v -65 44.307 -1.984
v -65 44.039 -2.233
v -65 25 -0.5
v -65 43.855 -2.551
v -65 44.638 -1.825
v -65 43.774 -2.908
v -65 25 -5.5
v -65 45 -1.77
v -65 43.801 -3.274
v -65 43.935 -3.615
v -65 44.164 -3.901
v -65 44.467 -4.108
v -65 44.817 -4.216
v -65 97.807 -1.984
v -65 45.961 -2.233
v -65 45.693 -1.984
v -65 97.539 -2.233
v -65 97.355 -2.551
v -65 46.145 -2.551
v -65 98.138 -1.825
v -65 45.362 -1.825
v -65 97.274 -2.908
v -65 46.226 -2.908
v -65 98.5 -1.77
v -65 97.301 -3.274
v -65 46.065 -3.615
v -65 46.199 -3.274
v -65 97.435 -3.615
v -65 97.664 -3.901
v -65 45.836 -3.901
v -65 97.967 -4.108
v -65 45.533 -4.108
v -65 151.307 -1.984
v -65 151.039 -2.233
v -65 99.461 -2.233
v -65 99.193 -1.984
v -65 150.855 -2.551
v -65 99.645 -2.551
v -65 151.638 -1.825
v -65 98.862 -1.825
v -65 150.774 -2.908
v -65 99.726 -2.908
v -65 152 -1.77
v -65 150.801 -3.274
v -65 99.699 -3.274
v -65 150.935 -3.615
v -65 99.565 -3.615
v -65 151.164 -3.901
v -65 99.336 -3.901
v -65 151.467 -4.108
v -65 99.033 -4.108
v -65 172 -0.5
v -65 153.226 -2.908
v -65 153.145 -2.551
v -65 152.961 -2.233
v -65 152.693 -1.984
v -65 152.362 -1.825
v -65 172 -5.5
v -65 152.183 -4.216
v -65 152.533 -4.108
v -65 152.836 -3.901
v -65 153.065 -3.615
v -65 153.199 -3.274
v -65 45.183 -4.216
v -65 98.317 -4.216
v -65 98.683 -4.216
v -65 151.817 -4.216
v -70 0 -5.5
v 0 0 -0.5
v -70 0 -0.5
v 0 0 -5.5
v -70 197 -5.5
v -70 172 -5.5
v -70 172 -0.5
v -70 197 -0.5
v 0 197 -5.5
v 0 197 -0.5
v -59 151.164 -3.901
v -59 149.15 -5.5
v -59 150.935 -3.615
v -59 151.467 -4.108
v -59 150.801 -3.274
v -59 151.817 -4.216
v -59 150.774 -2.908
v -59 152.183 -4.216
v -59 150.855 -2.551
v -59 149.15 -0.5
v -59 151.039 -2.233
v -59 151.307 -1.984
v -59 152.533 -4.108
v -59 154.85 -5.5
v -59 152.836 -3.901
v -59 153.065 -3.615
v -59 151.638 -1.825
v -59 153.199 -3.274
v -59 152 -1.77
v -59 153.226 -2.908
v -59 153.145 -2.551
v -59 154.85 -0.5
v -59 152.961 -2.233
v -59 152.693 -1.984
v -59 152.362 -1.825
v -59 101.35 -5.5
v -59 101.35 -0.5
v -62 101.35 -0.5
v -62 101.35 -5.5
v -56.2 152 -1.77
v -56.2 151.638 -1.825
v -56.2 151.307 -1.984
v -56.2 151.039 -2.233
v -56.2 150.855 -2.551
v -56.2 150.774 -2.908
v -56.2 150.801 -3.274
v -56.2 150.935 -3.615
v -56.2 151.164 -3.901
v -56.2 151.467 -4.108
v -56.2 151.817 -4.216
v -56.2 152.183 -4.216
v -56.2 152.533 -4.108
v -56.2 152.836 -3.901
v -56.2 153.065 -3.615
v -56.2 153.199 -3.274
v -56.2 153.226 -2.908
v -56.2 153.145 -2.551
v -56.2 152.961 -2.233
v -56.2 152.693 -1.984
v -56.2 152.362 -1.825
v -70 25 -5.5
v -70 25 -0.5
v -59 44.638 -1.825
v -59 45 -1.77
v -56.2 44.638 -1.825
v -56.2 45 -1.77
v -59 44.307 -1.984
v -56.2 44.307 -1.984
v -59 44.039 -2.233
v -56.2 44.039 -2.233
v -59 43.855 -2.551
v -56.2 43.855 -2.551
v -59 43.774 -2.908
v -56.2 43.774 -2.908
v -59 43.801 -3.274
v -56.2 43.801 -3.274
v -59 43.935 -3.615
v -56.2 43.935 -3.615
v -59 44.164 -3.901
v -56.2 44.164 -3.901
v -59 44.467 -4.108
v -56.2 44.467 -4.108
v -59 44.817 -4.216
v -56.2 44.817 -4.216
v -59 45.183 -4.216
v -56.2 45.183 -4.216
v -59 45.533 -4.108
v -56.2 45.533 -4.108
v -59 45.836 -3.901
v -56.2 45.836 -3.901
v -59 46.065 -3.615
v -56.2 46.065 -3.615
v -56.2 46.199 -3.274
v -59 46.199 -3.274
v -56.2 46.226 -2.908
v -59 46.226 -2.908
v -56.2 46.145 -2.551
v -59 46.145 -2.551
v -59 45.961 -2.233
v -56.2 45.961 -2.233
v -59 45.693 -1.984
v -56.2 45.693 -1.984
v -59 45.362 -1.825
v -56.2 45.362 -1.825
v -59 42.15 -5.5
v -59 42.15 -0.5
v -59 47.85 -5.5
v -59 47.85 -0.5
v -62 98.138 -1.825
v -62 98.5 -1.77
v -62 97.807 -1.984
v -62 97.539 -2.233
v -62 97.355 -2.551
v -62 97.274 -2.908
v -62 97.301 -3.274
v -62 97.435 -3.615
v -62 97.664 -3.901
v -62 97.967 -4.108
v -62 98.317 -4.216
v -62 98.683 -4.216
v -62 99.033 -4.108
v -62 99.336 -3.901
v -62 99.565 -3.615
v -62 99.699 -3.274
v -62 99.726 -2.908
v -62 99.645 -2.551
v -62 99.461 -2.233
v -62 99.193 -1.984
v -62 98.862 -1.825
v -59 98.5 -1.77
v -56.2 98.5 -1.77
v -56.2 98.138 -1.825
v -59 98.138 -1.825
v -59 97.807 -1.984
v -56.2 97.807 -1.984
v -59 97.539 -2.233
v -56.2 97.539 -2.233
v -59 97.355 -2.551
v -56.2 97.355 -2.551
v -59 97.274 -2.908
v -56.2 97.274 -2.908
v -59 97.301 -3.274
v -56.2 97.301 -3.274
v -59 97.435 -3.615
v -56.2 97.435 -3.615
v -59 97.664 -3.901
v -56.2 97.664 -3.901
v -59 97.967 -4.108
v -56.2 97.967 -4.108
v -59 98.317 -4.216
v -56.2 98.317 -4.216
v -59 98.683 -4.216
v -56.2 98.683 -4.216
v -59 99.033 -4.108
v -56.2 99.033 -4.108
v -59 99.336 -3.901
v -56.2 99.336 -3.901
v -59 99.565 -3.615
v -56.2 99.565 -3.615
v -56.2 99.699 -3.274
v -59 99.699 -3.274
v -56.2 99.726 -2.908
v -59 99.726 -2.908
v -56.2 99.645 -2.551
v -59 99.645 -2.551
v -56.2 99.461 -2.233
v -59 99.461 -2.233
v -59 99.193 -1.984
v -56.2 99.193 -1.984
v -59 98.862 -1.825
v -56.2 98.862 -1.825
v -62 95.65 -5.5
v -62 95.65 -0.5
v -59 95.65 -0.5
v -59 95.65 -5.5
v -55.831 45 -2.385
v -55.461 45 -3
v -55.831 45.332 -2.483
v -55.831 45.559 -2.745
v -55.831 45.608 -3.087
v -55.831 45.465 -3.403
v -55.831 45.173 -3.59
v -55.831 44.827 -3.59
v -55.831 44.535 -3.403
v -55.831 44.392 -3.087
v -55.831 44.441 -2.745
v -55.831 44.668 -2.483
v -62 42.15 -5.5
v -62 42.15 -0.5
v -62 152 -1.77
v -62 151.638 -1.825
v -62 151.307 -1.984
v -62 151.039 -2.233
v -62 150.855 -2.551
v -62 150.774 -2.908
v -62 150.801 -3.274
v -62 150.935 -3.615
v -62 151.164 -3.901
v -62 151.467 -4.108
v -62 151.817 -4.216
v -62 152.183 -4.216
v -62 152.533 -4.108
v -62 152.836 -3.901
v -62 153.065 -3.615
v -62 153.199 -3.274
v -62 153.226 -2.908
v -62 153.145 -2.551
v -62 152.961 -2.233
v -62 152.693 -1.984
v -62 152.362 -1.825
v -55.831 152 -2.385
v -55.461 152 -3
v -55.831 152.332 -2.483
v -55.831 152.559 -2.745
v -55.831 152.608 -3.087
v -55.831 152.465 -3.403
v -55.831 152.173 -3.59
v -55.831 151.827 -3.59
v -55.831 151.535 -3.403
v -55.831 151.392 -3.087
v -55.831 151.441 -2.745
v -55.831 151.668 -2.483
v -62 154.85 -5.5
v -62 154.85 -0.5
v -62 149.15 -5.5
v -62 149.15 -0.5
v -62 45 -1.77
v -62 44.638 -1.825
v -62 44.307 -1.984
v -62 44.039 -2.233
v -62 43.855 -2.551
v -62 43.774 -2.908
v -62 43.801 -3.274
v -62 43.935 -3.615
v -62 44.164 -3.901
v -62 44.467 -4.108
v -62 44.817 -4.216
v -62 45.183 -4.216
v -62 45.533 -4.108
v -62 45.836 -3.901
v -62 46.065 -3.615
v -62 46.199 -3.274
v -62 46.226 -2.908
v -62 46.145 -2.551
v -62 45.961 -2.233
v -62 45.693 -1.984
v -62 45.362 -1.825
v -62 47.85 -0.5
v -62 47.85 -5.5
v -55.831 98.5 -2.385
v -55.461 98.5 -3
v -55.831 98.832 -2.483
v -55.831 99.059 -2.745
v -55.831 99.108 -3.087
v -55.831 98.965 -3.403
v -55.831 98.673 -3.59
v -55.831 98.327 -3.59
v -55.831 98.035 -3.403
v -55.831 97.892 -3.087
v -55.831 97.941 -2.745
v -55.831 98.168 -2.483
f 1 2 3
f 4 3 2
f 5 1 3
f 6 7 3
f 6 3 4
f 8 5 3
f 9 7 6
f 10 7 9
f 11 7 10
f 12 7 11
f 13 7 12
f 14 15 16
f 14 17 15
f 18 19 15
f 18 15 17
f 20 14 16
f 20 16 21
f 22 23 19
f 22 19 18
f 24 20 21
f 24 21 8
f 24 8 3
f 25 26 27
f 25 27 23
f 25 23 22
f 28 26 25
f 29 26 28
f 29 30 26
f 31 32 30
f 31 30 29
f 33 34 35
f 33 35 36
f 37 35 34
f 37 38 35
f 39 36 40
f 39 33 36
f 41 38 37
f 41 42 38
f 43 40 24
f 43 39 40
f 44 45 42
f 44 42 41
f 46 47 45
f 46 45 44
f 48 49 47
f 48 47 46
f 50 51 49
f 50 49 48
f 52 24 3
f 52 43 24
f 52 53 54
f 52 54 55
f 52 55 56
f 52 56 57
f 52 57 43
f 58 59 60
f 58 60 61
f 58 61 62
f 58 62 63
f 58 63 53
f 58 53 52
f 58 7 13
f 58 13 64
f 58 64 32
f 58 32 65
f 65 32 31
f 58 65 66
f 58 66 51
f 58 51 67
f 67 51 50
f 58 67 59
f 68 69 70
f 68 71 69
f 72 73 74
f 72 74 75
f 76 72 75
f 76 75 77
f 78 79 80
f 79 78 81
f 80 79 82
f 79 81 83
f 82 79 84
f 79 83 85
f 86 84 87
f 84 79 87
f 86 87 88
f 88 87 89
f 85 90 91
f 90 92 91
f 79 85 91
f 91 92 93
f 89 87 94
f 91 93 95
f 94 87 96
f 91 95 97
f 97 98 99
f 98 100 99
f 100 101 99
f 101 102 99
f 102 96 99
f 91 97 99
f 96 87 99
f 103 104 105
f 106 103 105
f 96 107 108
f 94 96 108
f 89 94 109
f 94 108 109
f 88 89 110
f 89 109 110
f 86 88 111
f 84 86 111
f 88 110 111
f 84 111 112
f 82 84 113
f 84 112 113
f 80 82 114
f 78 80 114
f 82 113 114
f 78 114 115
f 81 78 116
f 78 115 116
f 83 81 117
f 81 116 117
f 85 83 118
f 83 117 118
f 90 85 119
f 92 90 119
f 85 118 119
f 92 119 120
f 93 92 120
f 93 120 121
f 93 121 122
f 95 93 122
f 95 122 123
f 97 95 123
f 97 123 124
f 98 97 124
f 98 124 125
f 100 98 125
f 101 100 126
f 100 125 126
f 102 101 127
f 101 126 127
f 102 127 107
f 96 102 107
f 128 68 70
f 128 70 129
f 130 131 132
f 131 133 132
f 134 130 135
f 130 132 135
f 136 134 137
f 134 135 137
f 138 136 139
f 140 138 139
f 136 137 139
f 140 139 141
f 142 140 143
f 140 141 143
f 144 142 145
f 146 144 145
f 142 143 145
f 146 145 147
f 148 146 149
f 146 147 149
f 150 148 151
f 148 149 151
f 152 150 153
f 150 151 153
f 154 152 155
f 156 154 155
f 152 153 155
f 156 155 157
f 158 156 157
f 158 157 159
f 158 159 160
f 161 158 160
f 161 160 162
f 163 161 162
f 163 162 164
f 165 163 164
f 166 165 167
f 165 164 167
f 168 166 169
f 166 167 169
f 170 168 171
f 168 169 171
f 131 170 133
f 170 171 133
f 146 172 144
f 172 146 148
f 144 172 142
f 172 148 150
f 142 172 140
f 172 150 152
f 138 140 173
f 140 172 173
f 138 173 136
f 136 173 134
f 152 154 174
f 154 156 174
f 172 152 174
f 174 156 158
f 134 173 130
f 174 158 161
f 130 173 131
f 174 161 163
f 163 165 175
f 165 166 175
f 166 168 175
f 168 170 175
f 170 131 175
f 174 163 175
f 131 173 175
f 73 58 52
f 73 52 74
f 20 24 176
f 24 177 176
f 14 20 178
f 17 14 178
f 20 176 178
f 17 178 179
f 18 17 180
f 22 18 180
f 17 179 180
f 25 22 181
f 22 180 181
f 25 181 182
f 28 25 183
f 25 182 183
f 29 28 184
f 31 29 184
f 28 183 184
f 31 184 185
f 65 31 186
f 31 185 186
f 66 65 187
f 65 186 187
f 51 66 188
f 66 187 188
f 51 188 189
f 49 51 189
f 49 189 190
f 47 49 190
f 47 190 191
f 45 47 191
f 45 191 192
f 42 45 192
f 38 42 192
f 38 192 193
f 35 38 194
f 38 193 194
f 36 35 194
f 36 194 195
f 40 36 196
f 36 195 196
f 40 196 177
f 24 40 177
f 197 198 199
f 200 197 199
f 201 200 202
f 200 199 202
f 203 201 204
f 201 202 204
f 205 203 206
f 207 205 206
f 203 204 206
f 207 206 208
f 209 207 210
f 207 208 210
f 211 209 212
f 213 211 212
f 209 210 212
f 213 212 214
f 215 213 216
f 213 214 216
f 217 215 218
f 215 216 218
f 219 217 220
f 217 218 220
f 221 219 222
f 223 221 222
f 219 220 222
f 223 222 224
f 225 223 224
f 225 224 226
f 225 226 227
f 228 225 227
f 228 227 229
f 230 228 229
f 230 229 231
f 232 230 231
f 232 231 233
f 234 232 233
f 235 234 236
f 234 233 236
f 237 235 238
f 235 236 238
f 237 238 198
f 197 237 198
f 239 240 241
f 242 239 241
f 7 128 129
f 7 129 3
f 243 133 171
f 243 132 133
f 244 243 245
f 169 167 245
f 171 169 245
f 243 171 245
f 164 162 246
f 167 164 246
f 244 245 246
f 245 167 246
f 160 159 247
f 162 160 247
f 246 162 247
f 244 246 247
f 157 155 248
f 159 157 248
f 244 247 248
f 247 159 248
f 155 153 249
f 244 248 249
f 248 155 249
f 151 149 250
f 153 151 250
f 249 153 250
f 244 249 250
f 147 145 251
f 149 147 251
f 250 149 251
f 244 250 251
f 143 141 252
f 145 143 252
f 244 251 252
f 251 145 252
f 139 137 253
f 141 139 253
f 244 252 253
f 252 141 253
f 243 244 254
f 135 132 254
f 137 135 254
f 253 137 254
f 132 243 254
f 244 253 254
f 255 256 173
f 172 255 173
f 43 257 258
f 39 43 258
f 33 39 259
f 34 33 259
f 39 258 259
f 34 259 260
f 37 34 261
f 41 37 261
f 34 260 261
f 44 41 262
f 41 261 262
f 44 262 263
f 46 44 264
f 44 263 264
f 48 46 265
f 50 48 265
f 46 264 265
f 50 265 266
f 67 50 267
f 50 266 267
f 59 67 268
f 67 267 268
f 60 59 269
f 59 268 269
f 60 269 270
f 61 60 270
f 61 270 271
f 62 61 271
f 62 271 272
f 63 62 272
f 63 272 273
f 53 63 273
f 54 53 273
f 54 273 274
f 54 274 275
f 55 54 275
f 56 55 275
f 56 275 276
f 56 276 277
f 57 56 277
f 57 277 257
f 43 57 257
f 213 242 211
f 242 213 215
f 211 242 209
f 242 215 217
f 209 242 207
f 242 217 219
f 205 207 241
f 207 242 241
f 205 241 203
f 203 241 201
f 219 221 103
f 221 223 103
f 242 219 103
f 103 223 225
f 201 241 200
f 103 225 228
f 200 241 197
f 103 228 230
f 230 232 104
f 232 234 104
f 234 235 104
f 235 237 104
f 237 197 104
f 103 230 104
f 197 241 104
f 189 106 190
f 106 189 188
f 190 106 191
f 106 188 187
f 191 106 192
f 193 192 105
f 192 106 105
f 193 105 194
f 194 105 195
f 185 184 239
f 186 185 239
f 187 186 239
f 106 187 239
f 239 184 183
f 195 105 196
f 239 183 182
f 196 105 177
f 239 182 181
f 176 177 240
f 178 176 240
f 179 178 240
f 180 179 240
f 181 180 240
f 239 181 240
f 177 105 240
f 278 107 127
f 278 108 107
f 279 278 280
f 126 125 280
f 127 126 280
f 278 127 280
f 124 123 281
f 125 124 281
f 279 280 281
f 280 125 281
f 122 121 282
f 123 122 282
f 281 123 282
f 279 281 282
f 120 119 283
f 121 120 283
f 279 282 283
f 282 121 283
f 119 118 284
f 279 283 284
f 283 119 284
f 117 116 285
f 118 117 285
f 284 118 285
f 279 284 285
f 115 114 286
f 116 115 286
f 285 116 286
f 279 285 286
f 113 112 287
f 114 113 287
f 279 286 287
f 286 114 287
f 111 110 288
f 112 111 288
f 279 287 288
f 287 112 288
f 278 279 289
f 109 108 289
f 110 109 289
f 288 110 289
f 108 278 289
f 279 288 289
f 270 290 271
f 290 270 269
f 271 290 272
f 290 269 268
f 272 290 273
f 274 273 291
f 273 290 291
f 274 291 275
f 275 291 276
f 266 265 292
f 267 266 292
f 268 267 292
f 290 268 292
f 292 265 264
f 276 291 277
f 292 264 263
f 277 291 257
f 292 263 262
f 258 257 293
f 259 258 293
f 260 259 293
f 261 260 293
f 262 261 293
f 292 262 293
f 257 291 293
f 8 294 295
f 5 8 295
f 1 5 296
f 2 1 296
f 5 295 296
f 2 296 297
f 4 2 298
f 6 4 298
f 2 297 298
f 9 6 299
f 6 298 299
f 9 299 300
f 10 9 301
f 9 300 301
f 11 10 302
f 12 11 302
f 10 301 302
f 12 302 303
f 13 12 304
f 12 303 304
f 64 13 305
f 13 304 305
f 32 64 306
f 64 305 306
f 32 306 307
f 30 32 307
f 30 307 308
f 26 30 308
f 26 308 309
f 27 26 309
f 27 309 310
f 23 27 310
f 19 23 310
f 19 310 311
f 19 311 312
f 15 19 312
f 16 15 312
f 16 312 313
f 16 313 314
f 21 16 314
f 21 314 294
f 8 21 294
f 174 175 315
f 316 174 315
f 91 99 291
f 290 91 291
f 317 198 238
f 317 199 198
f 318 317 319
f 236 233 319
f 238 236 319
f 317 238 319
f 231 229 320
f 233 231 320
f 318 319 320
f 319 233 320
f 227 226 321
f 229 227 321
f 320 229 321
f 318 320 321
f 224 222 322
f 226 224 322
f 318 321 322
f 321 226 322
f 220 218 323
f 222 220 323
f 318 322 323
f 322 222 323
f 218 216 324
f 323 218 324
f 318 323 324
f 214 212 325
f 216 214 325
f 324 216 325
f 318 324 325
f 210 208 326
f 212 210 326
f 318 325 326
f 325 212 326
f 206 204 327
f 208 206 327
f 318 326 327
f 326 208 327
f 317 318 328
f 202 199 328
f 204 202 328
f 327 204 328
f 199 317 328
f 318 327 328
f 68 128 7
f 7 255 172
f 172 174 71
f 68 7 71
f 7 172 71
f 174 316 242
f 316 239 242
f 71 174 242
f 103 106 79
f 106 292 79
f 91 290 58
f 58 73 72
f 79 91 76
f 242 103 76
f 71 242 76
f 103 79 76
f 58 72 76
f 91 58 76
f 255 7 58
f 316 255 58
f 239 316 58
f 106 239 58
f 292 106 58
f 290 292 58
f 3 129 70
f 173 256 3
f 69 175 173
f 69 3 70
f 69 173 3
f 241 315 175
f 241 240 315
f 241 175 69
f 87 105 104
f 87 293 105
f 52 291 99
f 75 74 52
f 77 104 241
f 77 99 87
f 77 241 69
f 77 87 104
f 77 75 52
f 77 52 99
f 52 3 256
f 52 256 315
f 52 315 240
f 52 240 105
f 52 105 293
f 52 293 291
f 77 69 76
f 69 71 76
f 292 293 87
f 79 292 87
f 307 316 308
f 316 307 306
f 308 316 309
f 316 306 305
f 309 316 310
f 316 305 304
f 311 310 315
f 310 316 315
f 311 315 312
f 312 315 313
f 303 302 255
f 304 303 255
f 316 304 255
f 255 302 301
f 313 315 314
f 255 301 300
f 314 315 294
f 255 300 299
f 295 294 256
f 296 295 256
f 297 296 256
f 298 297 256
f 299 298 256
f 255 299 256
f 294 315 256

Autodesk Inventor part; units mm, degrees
ref_plane "YZ Plane" through (0, 0, 0) normal (1, 0, 0) x (0, 1, 0)
ref_plane "XZ Plane" through (0, 0, 0) normal (0, 1, 0) x (-1, 0, 0)
ref_plane "XY Plane" through (0, 0, 0) normal (0, 0, 1) x (1, 0, 0)
ref_plane "Work Plane1" through (0, 0, -5.5) normal (0, 0, 1) x (1, 0, 0)
sketch "Sketch1" plane through (0, 0, -5.5) normal (0, 0, 1) x (1, 0, 0)
  line L0 (0, 197) -> (0, 0) construction
  line L1 (0, 197) -> (-20, 197) construction
  line L2 (-20, 0) -> (-20, 197) construction
  line L3 (0, 0) -> (-20, 0) construction
  line L4 (0, 0) -> (-70, 0) construction
  line L5 (-70, 0) -> (-70, -5) construction
  line L6 (0, -5) -> (-70, -5) construction
  line L7 (0, 0) -> (0, -5) construction
  line L8 (-70, 197) -> (0, 197) construction
  line L9 (0, 197) -> (0, 202) construction
  line L10 (-70, 202) -> (0, 202) construction
  line L11 (-70, 197) -> (-70, 202) construction
  line L12 (0, 0) -> (0, 197)
  line L13 (0, 0) -> (-70, 0)
  line L14 (-70, 0) -> (-70, 25)
  line L15 (-70, 25) -> (-65, 25)
  line L16 (-65, 25) -> (-65, 172)
  line L17 (-65, 172) -> (-70, 172)
  line L18 (-70, 172) -> (-70, 197)
  line L19 (-70, 197) -> (0, 197)
  line L20 (-65, 0) -> (-65, -5) construction
  dimension "d1" = 0
  dimension "d2" = 0
  dimension "d3" = 25
  dimension "d4" = 25
extrude "Extrusion1" add sketch "Sketch1" along normal blind 5
sketch "Sketch2" plane through (0, 0, -0.5) normal (0, 0, 1) x (1, 0, 0)
  point P0 (0, 0)
sketch "Sketch3" plane through (0, 0, -5.5) normal (0, 0, -1) x (-1, 0, 0)
  line L0 (0, 0) -> (0, 197) construction
  line L1 (0, 0) -> (20, 0) construction
  line L2 (20, 197) -> (20, 0) construction
  line L3 (0, 197) -> (20, 197) construction
  line L4 (10, 197) -> (10, 0) construction
  line L5 (0, 0) -> (0, 197) construction
  line L6 (0, 98.5) -> (20, 98.5) construction
  point P0 (10, 98.5)
  point P1 (10, 177)
  point P2 (10, 20)
  dimension "d7" = 20
  dimension "d8" = 20
hole "Hole1" [suppressed]
sketch "Sketch4" plane through (-65, 25, -5.5) normal (-1, 0, 0) x (0, 0, 1)
  line L0 (0, 147) -> (0, 0) construction
  line L1 (0, 0) -> (5, 0) construction
  line L2 (5, 147) -> (5, 0) construction
  line L3 (0, 147) -> (5, 147) construction
  line L4 (2.5, 0) -> (2.5, 147) construction
  line L5 (5, 147) -> (5, 0) construction
  line L6 (5, 73.5) -> (0, 73.5) construction
  point P0 (5.5, -25)
  point P1 (2.5, 73.5)
  point P2 (2.5, 127)
  point P3 (2.5, 20)
  dimension "d16" = 20
  dimension "d17" = 20
hole "Hole2" at (-65, 98.5, -3) at (-65, 152, -3) at (-65, 45, -3) direction (1, 0, 0) diameter 2.459 depth 8.8 tip angle 118 thread size "M3x0.5" class "6H" standard "ISO Metric profile"
sketch "Sketch5" plane through (0, 0, -0.5) normal (0, 0, 1) x (1, 0, 0)
  line L0 (-56.2, 46.2295) -> (-65, 46.2295) construction
  line L1 (-56.2, 43.7705) -> (-65, 43.7705) construction
  line L2 (-56.2, 99.7295) -> (-65, 99.7295) construction
  line L3 (-56.2, 97.2705) -> (-65, 97.2705) construction
  line L4 (-56.2, 153.2295) -> (-65, 153.2295) construction
  line L5 (-56.2, 150.7705) -> (-65, 150.7705) construction
  line L6 (-65, 43.7705) -> (-65, 46.2295) construction
  line L7 (-65, 43.7705) -> (-65, 46.2295) construction
  line L8 (-65, 45) -> (-57.2589, 45) construction
  line L9 (-62, 42.15) -> (-59, 42.15)
  line L10 (-59, 42.15) -> (-59, 47.85)
  line L11 (-59, 47.85) -> (-62, 47.85)
  line L12 (-62, 47.85) -> (-62, 42.15)
  line L13 (-65, 150.7705) -> (-65, 153.2295) construction
  line L14 (-65, 150.7705) -> (-65, 153.2295) construction
  line L15 (-65, 152) -> (-56.2589, 152) construction
  line L16 (-62, 149.15) -> (-59, 149.15)
  line L17 (-59, 149.15) -> (-59, 154.85)
  line L18 (-59, 154.85) -> (-62, 154.85)
  line L19 (-62, 154.85) -> (-62, 149.15)
  line L20 (-65, 97.2705) -> (-65, 99.7295) construction
  line L21 (-65, 97.2705) -> (-65, 99.7295) construction
  line L22 (-65, 98.5) -> (-54.9007, 98.5) construction
  line L23 (-62, 95.65) -> (-59, 95.65)
  line L24 (-59, 95.65) -> (-59, 101.35)
  line L25 (-59, 101.35) -> (-62, 101.35)
  line L26 (-62, 101.35) -> (-62, 95.65)
  point P0 (0, 0)
  dimension "d25" = 5.7
  dimension "d26" = 3
  dimension "d27" = 3
  dimension "d28" = 5.7
  dimension "d29" = 3
  dimension "d30" = 3
  dimension "d31" = 5.7
  dimension "d32" = 3
  dimension "d33" = 3
extrude "Extrusion2" cut sketch "Sketch5" against normal through all
sketch "Sketch6" plane through (0, 0, -5.5) normal (0, 0, -1) x (-1, 0, 0)
  line L0 (35, 87) -> (0, 87) projected
  arc A0 (35, 87) -> (35, 95) centre (35, 91) ccw projected
  line L1 (0, 95) -> (35, 95) projected
  line L2 (0, 95) -> (0, 87)
  line L3 (0, 0) -> (0, 197) projected
  line L4 (65, 153) -> (65, 110) construction
  line L5 (70, 153) -> (65, 153) construction
  line L6 (70, 110) -> (70, 153) construction
  line L7 (70, 110) -> (65, 110) construction
  line L8 (70, 131.5) -> (0, 131.5) construction
  line L9 (62, 139) -> (47, 139)
  line L10 (47, 139) -> (47, 124)
  line L11 (47, 124) -> (62, 124)
  line L12 (62, 124) -> (62, 139)
  dimension "d36" = 15
  dimension "d37" = 15
  dimension "d38" = 3
extrude "Extrusion3" [suppressed]
equation "\"d4\" = d3"
equation "\"d5\" = plate_thickness"
equation "\"d8\" = d7"
equation "\"d17\" = d16"
equation "\"plate_thickness\" = 5"
equation "\"basic_plate_offset\" = 0"
equation "\"ABS_tolerance\" = 0"
equation "\"laser_cutter_thickness\" = 0.1"
properties part number "fronts-02"
